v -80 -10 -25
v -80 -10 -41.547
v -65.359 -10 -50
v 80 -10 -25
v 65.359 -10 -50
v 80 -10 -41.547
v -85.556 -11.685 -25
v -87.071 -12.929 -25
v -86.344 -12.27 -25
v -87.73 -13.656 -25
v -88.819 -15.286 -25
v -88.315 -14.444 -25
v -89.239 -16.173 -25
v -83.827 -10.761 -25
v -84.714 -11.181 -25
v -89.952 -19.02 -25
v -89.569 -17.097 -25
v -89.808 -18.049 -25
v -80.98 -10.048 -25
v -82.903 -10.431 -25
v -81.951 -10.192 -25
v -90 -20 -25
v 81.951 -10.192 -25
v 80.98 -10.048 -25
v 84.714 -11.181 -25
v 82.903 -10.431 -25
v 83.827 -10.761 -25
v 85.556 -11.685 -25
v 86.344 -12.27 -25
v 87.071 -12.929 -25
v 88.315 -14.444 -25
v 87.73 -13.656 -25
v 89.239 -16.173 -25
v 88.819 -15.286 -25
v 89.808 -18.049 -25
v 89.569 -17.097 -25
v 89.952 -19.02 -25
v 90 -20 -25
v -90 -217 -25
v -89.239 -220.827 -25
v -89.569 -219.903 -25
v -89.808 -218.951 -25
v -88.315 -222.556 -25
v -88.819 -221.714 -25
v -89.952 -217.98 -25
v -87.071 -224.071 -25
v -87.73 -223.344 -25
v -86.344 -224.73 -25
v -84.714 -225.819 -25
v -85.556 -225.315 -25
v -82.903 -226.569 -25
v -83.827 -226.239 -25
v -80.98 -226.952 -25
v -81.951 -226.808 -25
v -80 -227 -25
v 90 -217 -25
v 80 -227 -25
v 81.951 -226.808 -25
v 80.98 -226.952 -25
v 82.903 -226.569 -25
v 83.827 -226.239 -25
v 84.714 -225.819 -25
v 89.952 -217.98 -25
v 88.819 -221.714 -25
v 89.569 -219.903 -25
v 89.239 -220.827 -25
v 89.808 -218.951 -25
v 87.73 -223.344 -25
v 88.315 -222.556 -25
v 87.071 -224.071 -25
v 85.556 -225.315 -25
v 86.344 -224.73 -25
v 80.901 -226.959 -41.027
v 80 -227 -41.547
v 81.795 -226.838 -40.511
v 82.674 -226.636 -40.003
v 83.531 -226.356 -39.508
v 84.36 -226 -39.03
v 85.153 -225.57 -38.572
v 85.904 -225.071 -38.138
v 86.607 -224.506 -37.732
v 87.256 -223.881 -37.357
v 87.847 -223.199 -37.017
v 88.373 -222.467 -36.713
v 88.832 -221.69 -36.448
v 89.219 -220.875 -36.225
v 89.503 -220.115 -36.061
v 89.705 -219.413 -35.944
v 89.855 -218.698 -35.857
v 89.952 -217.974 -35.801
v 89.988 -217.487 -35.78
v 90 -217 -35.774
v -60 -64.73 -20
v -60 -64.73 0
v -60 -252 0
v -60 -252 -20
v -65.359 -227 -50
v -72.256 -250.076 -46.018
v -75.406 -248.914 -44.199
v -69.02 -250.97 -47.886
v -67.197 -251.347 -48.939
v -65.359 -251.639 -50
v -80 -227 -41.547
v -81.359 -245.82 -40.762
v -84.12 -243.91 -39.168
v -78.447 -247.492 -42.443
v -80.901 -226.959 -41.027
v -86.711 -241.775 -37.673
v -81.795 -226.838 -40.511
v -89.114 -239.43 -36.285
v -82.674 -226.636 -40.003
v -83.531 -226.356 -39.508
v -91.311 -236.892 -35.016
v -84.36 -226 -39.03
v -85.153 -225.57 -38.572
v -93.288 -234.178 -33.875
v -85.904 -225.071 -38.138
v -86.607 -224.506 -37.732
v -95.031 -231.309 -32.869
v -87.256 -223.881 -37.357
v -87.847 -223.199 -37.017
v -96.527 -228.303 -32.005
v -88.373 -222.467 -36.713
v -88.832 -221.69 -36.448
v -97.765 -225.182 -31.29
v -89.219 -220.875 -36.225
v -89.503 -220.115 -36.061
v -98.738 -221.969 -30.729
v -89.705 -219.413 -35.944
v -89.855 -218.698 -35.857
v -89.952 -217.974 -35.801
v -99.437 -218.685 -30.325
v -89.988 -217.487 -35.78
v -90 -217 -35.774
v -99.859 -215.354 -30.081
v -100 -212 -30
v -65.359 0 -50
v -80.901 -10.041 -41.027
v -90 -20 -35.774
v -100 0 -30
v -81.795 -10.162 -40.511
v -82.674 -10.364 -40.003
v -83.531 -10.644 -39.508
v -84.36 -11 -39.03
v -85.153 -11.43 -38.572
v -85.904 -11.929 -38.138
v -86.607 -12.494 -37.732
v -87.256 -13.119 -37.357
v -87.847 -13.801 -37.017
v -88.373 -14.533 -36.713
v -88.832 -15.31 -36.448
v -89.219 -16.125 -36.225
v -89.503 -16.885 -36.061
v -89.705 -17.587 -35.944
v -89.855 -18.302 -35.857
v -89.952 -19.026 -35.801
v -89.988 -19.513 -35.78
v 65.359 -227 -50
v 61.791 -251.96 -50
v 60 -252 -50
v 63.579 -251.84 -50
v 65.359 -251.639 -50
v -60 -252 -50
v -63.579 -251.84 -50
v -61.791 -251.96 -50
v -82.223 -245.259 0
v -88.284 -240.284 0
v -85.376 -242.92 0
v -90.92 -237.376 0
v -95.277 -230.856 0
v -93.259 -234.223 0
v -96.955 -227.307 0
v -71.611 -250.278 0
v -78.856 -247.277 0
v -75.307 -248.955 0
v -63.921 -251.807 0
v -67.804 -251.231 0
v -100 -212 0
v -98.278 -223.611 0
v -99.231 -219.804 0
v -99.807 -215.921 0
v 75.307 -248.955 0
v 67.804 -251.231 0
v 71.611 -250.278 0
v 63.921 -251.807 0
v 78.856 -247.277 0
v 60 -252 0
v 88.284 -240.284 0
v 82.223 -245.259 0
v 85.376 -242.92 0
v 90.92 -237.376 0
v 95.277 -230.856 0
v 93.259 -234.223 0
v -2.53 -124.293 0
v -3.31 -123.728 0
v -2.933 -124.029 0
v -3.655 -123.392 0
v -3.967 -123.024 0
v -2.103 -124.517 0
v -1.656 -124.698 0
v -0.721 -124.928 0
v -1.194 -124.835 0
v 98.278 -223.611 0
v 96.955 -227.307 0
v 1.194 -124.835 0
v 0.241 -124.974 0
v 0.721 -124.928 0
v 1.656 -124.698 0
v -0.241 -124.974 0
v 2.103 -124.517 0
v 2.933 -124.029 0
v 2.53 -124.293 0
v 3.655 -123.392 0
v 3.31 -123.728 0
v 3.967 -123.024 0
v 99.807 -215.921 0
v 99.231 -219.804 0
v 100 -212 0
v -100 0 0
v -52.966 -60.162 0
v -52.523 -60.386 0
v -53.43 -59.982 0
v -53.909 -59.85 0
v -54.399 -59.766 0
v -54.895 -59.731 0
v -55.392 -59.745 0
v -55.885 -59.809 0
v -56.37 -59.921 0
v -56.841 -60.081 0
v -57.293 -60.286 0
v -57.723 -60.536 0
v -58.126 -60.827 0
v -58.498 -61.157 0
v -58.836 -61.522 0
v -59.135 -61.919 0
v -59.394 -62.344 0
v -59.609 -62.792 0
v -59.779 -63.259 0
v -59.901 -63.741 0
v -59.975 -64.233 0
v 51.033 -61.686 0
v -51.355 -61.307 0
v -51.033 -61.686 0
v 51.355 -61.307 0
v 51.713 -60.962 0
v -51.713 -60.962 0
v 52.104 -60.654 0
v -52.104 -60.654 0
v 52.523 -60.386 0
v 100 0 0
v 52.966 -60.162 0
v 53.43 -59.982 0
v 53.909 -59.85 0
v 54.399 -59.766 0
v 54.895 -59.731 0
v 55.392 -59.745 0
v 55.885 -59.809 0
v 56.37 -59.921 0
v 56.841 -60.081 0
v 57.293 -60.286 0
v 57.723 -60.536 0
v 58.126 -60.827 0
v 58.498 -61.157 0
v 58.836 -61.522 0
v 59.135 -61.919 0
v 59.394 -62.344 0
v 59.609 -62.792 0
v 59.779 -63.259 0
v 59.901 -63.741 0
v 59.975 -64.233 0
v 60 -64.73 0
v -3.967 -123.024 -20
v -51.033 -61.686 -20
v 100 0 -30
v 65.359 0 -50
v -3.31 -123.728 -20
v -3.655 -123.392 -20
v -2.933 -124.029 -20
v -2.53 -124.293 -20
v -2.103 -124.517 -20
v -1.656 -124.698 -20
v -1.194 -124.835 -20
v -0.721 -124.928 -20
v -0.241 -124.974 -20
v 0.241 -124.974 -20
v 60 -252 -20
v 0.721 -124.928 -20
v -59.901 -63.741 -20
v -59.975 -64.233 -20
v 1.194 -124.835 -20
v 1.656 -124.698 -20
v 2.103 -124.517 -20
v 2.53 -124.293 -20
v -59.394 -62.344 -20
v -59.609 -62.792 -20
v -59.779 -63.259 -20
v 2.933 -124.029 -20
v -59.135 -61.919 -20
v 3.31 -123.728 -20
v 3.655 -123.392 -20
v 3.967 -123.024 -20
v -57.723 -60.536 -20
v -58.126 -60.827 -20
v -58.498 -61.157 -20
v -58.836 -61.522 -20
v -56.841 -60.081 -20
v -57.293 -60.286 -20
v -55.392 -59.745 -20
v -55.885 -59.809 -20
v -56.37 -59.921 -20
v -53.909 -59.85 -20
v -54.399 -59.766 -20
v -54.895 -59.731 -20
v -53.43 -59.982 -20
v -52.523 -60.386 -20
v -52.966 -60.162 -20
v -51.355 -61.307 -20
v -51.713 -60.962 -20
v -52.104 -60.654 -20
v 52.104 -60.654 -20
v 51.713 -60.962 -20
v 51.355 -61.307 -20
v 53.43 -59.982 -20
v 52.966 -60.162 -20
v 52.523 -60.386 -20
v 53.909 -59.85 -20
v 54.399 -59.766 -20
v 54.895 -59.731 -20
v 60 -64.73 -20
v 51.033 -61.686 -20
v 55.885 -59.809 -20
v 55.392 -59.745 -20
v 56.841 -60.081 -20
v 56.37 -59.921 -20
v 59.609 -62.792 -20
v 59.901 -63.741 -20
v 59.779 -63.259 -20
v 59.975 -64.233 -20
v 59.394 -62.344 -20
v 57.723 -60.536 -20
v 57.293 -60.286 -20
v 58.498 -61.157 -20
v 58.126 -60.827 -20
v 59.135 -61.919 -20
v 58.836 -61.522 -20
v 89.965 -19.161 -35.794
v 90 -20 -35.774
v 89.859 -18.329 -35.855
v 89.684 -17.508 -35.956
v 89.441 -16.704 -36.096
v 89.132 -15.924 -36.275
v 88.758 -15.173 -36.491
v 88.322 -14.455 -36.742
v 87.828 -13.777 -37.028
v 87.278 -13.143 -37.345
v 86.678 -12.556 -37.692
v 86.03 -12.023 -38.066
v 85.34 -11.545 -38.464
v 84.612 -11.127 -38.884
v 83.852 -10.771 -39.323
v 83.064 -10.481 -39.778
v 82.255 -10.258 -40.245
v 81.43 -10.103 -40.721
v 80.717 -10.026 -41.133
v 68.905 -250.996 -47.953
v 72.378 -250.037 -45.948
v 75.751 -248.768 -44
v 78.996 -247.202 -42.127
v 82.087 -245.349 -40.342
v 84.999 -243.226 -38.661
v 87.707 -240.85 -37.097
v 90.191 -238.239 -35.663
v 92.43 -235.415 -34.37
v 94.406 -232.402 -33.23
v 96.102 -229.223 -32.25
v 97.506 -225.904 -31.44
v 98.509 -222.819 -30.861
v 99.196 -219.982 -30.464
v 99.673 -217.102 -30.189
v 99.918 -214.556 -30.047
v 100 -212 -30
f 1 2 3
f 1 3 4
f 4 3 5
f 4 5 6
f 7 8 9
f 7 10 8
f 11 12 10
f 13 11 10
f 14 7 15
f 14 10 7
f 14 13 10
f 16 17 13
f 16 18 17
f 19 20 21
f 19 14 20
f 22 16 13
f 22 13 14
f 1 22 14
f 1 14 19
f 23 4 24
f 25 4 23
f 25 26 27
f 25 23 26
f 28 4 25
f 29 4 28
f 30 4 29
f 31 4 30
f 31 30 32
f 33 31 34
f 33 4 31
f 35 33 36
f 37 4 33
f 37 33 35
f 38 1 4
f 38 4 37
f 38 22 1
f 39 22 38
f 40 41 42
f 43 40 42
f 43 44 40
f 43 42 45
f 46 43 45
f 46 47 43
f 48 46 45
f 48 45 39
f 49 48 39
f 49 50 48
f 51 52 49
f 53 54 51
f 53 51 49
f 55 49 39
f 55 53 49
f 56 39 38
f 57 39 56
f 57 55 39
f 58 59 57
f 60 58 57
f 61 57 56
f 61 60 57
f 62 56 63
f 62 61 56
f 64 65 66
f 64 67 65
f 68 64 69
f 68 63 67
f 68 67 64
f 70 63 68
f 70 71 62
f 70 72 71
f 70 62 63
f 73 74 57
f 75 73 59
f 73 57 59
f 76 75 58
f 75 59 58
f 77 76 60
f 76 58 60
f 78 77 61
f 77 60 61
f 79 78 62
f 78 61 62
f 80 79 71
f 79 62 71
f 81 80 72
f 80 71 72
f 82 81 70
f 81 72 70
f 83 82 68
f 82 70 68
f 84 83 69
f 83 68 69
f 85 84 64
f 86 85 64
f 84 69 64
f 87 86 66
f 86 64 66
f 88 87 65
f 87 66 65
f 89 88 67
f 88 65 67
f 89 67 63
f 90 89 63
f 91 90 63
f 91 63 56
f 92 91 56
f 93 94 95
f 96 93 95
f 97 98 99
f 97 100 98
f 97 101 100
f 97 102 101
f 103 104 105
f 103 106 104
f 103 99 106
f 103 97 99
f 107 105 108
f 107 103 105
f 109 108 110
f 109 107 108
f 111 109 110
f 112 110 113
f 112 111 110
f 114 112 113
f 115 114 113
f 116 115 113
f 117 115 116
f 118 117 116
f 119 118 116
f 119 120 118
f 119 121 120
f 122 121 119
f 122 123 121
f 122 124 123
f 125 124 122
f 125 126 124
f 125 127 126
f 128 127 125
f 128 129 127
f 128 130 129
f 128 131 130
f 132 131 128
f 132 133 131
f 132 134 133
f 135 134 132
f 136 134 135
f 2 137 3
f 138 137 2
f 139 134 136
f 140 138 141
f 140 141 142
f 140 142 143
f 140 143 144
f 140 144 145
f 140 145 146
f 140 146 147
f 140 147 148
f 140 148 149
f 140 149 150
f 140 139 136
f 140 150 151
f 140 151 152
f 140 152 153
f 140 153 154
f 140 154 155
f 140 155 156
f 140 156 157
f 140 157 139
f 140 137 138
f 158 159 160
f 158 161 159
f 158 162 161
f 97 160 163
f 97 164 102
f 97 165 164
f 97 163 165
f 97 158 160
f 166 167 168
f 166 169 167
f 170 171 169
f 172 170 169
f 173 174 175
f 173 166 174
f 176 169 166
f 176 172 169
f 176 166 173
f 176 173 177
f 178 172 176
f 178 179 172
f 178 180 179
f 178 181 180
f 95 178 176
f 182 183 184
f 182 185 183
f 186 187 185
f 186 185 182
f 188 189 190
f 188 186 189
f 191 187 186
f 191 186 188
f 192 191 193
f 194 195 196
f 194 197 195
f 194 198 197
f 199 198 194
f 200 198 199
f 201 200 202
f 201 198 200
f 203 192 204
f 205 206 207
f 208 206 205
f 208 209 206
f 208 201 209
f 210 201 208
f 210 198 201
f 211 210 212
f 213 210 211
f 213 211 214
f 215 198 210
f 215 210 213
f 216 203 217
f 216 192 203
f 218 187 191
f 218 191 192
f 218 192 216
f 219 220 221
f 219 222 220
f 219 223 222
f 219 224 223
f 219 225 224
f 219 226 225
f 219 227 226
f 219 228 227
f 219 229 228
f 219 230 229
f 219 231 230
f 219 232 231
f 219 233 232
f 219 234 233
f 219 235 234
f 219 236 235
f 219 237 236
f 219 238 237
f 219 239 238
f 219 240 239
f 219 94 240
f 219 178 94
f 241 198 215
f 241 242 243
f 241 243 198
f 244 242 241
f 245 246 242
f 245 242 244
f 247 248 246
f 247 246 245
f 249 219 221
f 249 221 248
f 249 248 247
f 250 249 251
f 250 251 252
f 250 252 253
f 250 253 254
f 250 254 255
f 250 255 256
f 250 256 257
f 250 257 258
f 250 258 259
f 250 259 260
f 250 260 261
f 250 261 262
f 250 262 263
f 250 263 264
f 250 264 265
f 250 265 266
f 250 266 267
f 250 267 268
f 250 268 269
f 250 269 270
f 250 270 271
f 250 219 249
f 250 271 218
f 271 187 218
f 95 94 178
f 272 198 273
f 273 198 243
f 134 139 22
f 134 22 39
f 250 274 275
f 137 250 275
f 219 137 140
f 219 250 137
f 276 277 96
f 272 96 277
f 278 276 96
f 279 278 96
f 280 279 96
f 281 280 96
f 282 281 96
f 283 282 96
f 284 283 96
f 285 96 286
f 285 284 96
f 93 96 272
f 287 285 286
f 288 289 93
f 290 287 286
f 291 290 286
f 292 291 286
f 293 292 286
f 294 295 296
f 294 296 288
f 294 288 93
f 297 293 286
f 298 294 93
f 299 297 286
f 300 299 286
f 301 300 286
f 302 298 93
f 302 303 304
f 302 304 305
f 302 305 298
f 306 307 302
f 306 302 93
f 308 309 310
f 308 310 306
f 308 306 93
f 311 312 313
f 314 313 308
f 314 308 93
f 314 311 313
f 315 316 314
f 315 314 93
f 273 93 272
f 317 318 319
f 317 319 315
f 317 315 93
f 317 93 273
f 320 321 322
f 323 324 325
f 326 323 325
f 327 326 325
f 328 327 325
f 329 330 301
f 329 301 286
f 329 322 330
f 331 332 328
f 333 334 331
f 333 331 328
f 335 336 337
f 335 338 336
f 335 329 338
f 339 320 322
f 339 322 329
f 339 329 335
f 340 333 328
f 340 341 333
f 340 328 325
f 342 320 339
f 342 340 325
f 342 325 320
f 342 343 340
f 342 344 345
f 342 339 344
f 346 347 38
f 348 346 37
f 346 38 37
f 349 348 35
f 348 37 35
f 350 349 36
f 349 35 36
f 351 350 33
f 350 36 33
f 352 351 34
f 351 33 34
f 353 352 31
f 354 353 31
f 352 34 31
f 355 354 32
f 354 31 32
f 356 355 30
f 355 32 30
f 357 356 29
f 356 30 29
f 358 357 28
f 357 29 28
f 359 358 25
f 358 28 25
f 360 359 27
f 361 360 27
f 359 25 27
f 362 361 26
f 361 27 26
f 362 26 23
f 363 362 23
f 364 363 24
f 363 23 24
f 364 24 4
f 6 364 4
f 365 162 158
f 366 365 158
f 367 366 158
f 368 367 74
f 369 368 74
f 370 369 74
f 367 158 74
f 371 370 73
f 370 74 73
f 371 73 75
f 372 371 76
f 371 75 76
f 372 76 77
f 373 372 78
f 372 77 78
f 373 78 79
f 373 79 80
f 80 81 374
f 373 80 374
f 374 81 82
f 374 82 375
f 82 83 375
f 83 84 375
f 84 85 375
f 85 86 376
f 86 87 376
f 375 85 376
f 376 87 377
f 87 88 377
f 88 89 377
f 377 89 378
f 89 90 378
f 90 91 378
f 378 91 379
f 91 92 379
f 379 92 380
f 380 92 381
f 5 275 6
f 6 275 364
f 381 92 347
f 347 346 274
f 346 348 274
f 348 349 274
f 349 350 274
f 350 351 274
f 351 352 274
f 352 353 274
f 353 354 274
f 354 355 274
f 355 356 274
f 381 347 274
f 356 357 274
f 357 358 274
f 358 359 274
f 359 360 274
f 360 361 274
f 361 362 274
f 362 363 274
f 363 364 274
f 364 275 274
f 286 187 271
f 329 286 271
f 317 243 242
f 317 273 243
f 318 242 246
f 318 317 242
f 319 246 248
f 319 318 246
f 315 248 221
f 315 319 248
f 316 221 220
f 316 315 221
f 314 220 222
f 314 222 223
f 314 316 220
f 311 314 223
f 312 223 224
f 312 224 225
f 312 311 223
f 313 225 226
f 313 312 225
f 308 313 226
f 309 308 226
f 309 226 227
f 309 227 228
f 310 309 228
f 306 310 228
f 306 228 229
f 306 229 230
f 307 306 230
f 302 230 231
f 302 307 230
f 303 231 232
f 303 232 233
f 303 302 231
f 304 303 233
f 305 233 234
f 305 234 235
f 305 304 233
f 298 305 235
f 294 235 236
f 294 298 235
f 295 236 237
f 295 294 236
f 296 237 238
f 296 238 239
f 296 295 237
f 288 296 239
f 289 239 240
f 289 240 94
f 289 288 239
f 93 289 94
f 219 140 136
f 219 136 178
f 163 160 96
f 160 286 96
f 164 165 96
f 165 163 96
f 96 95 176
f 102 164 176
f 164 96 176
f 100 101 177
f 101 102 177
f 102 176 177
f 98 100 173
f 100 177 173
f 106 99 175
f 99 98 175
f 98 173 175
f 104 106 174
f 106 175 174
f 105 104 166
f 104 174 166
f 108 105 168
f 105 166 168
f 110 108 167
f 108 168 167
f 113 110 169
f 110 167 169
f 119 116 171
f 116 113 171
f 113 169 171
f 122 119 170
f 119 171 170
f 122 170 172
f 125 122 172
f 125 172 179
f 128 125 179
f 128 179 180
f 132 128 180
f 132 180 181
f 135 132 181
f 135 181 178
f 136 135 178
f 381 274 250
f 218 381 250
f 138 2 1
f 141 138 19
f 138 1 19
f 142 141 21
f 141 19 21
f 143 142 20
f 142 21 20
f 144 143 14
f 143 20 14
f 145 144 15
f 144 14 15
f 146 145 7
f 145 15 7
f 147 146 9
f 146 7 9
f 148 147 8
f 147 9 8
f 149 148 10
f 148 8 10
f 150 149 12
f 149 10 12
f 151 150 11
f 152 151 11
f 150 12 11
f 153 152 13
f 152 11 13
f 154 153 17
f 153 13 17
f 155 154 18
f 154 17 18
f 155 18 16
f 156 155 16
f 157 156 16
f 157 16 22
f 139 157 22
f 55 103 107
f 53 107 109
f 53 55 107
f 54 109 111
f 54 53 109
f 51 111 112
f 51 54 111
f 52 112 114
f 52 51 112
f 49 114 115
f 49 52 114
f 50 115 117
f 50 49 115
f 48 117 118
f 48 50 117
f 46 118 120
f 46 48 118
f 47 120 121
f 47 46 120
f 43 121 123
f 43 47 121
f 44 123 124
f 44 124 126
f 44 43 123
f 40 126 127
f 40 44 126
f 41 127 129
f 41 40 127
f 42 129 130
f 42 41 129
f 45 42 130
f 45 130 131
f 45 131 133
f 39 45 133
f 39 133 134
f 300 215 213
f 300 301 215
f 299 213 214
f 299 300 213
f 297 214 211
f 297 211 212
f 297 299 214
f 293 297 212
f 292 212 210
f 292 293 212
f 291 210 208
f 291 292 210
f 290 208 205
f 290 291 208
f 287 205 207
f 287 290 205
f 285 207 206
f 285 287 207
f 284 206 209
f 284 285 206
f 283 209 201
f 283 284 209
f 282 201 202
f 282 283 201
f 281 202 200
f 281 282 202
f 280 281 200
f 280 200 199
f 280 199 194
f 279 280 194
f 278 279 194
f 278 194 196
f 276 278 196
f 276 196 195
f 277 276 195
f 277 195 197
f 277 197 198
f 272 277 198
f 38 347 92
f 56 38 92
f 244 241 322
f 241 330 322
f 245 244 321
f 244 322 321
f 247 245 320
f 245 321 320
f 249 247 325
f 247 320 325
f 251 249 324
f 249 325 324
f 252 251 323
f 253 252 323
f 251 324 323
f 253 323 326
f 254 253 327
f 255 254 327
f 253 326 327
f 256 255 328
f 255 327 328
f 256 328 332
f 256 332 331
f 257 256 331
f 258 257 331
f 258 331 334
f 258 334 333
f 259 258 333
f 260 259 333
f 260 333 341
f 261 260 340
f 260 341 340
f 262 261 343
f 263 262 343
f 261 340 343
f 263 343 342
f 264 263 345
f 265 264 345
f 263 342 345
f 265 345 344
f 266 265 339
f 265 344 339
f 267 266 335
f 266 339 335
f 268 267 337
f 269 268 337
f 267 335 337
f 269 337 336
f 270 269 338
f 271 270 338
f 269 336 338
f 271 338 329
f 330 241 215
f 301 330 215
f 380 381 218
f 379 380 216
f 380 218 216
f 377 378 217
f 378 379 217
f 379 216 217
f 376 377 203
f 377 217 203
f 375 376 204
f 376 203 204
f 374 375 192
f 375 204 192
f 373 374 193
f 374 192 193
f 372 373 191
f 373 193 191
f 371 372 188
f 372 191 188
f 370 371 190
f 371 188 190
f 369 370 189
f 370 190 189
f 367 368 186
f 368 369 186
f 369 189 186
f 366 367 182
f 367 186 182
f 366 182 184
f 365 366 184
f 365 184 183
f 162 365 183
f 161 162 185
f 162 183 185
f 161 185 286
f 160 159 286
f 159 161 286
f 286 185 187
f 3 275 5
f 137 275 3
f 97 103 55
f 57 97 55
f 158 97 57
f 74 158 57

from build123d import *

# Parameters (mm, degrees)
F1_DEPTH  = 252
F4_DEPTH  = 20
F6_DEPTH  = 50.001
F7_R      = 5
F8_R      = 5
F9_W      = 180
F9_H      = 217
F10_DEPTH = 25
F11_R     = 10


with BuildPart() as f1:
    # F0 (on Front) → F1 (new body)
    with BuildSketch(Plane.XZ):
        Polygon((100, 0), (0, 0), (0, -50), (65.3589838486, -50), (100, -30), align=None)
    extrude(amount=F1_DEPTH)

    # F2: F1 across plane


with BuildPart() as f1_1:
    add(f1.part)
    add(f1.part.mirror(Plane.YZ))

    # F3 (on face) → F4 (cut)
    with BuildSketch(Plane.XY):
        Polygon((-60, -252), (60, -252), (60, -50), (0, -128.1935223705), (-60, -50), align=None)
    extrude(amount=-F4_DEPTH, mode=Mode.SUBTRACT)

    # F5 (on face) → F6 (cut, through all)
    with BuildSketch(Plane.XY):
        with BuildLine():
            ThreePointArc((100, -212), (88.2842712475, -240.2842712475), (60, -252))
            Line((60, -252), (100, -252))
            Line((100, -252), (100, -212))
        make_face()
        with BuildLine():
            Line((-100, -252), (-60, -252))
            ThreePointArc((-60, -252), (-88.2842712475, -240.2842712475), (-100, -212))
            Line((-100, -212), (-100, -252))
        make_face()
    extrude(amount=-F6_DEPTH, mode=Mode.SUBTRACT)

    # F7
    f7_edges = [f1_1.edges().sort_by_distance(p)[0] for p in [
        (0, -128.193522, -10),
    ]]
    fillet(f7_edges, radius=F7_R)

    # F8
    f8_edges = [f1_1.edges().sort_by_distance(p)[0] for p in [
        (60, -50, -10),
        (-60, -50, -10),
    ]]
    fillet(f8_edges, radius=F8_R)

    # F9 (on face) → F10 (cut)
    with BuildSketch(Plane(origin=(0, 0, -50), x_dir=(1, 0, 0), z_dir=(0, 0, -1))):
        with Locations((0, 118.5)):
            Rectangle(F9_W, F9_H)
    extrude(amount=-F10_DEPTH, mode=Mode.SUBTRACT)

    # F11
    f11_edges = [f1_1.edges().sort_by_distance(p)[0] for p in [
        (90, -10, -30.386751),
        (-90, -10, -30.386751),
        (-90, -227, -30.386751),
        (90, -227, -30.386751),
    ]]
    fillet(f11_edges, radius=F11_R)


solid = f1_1.part
